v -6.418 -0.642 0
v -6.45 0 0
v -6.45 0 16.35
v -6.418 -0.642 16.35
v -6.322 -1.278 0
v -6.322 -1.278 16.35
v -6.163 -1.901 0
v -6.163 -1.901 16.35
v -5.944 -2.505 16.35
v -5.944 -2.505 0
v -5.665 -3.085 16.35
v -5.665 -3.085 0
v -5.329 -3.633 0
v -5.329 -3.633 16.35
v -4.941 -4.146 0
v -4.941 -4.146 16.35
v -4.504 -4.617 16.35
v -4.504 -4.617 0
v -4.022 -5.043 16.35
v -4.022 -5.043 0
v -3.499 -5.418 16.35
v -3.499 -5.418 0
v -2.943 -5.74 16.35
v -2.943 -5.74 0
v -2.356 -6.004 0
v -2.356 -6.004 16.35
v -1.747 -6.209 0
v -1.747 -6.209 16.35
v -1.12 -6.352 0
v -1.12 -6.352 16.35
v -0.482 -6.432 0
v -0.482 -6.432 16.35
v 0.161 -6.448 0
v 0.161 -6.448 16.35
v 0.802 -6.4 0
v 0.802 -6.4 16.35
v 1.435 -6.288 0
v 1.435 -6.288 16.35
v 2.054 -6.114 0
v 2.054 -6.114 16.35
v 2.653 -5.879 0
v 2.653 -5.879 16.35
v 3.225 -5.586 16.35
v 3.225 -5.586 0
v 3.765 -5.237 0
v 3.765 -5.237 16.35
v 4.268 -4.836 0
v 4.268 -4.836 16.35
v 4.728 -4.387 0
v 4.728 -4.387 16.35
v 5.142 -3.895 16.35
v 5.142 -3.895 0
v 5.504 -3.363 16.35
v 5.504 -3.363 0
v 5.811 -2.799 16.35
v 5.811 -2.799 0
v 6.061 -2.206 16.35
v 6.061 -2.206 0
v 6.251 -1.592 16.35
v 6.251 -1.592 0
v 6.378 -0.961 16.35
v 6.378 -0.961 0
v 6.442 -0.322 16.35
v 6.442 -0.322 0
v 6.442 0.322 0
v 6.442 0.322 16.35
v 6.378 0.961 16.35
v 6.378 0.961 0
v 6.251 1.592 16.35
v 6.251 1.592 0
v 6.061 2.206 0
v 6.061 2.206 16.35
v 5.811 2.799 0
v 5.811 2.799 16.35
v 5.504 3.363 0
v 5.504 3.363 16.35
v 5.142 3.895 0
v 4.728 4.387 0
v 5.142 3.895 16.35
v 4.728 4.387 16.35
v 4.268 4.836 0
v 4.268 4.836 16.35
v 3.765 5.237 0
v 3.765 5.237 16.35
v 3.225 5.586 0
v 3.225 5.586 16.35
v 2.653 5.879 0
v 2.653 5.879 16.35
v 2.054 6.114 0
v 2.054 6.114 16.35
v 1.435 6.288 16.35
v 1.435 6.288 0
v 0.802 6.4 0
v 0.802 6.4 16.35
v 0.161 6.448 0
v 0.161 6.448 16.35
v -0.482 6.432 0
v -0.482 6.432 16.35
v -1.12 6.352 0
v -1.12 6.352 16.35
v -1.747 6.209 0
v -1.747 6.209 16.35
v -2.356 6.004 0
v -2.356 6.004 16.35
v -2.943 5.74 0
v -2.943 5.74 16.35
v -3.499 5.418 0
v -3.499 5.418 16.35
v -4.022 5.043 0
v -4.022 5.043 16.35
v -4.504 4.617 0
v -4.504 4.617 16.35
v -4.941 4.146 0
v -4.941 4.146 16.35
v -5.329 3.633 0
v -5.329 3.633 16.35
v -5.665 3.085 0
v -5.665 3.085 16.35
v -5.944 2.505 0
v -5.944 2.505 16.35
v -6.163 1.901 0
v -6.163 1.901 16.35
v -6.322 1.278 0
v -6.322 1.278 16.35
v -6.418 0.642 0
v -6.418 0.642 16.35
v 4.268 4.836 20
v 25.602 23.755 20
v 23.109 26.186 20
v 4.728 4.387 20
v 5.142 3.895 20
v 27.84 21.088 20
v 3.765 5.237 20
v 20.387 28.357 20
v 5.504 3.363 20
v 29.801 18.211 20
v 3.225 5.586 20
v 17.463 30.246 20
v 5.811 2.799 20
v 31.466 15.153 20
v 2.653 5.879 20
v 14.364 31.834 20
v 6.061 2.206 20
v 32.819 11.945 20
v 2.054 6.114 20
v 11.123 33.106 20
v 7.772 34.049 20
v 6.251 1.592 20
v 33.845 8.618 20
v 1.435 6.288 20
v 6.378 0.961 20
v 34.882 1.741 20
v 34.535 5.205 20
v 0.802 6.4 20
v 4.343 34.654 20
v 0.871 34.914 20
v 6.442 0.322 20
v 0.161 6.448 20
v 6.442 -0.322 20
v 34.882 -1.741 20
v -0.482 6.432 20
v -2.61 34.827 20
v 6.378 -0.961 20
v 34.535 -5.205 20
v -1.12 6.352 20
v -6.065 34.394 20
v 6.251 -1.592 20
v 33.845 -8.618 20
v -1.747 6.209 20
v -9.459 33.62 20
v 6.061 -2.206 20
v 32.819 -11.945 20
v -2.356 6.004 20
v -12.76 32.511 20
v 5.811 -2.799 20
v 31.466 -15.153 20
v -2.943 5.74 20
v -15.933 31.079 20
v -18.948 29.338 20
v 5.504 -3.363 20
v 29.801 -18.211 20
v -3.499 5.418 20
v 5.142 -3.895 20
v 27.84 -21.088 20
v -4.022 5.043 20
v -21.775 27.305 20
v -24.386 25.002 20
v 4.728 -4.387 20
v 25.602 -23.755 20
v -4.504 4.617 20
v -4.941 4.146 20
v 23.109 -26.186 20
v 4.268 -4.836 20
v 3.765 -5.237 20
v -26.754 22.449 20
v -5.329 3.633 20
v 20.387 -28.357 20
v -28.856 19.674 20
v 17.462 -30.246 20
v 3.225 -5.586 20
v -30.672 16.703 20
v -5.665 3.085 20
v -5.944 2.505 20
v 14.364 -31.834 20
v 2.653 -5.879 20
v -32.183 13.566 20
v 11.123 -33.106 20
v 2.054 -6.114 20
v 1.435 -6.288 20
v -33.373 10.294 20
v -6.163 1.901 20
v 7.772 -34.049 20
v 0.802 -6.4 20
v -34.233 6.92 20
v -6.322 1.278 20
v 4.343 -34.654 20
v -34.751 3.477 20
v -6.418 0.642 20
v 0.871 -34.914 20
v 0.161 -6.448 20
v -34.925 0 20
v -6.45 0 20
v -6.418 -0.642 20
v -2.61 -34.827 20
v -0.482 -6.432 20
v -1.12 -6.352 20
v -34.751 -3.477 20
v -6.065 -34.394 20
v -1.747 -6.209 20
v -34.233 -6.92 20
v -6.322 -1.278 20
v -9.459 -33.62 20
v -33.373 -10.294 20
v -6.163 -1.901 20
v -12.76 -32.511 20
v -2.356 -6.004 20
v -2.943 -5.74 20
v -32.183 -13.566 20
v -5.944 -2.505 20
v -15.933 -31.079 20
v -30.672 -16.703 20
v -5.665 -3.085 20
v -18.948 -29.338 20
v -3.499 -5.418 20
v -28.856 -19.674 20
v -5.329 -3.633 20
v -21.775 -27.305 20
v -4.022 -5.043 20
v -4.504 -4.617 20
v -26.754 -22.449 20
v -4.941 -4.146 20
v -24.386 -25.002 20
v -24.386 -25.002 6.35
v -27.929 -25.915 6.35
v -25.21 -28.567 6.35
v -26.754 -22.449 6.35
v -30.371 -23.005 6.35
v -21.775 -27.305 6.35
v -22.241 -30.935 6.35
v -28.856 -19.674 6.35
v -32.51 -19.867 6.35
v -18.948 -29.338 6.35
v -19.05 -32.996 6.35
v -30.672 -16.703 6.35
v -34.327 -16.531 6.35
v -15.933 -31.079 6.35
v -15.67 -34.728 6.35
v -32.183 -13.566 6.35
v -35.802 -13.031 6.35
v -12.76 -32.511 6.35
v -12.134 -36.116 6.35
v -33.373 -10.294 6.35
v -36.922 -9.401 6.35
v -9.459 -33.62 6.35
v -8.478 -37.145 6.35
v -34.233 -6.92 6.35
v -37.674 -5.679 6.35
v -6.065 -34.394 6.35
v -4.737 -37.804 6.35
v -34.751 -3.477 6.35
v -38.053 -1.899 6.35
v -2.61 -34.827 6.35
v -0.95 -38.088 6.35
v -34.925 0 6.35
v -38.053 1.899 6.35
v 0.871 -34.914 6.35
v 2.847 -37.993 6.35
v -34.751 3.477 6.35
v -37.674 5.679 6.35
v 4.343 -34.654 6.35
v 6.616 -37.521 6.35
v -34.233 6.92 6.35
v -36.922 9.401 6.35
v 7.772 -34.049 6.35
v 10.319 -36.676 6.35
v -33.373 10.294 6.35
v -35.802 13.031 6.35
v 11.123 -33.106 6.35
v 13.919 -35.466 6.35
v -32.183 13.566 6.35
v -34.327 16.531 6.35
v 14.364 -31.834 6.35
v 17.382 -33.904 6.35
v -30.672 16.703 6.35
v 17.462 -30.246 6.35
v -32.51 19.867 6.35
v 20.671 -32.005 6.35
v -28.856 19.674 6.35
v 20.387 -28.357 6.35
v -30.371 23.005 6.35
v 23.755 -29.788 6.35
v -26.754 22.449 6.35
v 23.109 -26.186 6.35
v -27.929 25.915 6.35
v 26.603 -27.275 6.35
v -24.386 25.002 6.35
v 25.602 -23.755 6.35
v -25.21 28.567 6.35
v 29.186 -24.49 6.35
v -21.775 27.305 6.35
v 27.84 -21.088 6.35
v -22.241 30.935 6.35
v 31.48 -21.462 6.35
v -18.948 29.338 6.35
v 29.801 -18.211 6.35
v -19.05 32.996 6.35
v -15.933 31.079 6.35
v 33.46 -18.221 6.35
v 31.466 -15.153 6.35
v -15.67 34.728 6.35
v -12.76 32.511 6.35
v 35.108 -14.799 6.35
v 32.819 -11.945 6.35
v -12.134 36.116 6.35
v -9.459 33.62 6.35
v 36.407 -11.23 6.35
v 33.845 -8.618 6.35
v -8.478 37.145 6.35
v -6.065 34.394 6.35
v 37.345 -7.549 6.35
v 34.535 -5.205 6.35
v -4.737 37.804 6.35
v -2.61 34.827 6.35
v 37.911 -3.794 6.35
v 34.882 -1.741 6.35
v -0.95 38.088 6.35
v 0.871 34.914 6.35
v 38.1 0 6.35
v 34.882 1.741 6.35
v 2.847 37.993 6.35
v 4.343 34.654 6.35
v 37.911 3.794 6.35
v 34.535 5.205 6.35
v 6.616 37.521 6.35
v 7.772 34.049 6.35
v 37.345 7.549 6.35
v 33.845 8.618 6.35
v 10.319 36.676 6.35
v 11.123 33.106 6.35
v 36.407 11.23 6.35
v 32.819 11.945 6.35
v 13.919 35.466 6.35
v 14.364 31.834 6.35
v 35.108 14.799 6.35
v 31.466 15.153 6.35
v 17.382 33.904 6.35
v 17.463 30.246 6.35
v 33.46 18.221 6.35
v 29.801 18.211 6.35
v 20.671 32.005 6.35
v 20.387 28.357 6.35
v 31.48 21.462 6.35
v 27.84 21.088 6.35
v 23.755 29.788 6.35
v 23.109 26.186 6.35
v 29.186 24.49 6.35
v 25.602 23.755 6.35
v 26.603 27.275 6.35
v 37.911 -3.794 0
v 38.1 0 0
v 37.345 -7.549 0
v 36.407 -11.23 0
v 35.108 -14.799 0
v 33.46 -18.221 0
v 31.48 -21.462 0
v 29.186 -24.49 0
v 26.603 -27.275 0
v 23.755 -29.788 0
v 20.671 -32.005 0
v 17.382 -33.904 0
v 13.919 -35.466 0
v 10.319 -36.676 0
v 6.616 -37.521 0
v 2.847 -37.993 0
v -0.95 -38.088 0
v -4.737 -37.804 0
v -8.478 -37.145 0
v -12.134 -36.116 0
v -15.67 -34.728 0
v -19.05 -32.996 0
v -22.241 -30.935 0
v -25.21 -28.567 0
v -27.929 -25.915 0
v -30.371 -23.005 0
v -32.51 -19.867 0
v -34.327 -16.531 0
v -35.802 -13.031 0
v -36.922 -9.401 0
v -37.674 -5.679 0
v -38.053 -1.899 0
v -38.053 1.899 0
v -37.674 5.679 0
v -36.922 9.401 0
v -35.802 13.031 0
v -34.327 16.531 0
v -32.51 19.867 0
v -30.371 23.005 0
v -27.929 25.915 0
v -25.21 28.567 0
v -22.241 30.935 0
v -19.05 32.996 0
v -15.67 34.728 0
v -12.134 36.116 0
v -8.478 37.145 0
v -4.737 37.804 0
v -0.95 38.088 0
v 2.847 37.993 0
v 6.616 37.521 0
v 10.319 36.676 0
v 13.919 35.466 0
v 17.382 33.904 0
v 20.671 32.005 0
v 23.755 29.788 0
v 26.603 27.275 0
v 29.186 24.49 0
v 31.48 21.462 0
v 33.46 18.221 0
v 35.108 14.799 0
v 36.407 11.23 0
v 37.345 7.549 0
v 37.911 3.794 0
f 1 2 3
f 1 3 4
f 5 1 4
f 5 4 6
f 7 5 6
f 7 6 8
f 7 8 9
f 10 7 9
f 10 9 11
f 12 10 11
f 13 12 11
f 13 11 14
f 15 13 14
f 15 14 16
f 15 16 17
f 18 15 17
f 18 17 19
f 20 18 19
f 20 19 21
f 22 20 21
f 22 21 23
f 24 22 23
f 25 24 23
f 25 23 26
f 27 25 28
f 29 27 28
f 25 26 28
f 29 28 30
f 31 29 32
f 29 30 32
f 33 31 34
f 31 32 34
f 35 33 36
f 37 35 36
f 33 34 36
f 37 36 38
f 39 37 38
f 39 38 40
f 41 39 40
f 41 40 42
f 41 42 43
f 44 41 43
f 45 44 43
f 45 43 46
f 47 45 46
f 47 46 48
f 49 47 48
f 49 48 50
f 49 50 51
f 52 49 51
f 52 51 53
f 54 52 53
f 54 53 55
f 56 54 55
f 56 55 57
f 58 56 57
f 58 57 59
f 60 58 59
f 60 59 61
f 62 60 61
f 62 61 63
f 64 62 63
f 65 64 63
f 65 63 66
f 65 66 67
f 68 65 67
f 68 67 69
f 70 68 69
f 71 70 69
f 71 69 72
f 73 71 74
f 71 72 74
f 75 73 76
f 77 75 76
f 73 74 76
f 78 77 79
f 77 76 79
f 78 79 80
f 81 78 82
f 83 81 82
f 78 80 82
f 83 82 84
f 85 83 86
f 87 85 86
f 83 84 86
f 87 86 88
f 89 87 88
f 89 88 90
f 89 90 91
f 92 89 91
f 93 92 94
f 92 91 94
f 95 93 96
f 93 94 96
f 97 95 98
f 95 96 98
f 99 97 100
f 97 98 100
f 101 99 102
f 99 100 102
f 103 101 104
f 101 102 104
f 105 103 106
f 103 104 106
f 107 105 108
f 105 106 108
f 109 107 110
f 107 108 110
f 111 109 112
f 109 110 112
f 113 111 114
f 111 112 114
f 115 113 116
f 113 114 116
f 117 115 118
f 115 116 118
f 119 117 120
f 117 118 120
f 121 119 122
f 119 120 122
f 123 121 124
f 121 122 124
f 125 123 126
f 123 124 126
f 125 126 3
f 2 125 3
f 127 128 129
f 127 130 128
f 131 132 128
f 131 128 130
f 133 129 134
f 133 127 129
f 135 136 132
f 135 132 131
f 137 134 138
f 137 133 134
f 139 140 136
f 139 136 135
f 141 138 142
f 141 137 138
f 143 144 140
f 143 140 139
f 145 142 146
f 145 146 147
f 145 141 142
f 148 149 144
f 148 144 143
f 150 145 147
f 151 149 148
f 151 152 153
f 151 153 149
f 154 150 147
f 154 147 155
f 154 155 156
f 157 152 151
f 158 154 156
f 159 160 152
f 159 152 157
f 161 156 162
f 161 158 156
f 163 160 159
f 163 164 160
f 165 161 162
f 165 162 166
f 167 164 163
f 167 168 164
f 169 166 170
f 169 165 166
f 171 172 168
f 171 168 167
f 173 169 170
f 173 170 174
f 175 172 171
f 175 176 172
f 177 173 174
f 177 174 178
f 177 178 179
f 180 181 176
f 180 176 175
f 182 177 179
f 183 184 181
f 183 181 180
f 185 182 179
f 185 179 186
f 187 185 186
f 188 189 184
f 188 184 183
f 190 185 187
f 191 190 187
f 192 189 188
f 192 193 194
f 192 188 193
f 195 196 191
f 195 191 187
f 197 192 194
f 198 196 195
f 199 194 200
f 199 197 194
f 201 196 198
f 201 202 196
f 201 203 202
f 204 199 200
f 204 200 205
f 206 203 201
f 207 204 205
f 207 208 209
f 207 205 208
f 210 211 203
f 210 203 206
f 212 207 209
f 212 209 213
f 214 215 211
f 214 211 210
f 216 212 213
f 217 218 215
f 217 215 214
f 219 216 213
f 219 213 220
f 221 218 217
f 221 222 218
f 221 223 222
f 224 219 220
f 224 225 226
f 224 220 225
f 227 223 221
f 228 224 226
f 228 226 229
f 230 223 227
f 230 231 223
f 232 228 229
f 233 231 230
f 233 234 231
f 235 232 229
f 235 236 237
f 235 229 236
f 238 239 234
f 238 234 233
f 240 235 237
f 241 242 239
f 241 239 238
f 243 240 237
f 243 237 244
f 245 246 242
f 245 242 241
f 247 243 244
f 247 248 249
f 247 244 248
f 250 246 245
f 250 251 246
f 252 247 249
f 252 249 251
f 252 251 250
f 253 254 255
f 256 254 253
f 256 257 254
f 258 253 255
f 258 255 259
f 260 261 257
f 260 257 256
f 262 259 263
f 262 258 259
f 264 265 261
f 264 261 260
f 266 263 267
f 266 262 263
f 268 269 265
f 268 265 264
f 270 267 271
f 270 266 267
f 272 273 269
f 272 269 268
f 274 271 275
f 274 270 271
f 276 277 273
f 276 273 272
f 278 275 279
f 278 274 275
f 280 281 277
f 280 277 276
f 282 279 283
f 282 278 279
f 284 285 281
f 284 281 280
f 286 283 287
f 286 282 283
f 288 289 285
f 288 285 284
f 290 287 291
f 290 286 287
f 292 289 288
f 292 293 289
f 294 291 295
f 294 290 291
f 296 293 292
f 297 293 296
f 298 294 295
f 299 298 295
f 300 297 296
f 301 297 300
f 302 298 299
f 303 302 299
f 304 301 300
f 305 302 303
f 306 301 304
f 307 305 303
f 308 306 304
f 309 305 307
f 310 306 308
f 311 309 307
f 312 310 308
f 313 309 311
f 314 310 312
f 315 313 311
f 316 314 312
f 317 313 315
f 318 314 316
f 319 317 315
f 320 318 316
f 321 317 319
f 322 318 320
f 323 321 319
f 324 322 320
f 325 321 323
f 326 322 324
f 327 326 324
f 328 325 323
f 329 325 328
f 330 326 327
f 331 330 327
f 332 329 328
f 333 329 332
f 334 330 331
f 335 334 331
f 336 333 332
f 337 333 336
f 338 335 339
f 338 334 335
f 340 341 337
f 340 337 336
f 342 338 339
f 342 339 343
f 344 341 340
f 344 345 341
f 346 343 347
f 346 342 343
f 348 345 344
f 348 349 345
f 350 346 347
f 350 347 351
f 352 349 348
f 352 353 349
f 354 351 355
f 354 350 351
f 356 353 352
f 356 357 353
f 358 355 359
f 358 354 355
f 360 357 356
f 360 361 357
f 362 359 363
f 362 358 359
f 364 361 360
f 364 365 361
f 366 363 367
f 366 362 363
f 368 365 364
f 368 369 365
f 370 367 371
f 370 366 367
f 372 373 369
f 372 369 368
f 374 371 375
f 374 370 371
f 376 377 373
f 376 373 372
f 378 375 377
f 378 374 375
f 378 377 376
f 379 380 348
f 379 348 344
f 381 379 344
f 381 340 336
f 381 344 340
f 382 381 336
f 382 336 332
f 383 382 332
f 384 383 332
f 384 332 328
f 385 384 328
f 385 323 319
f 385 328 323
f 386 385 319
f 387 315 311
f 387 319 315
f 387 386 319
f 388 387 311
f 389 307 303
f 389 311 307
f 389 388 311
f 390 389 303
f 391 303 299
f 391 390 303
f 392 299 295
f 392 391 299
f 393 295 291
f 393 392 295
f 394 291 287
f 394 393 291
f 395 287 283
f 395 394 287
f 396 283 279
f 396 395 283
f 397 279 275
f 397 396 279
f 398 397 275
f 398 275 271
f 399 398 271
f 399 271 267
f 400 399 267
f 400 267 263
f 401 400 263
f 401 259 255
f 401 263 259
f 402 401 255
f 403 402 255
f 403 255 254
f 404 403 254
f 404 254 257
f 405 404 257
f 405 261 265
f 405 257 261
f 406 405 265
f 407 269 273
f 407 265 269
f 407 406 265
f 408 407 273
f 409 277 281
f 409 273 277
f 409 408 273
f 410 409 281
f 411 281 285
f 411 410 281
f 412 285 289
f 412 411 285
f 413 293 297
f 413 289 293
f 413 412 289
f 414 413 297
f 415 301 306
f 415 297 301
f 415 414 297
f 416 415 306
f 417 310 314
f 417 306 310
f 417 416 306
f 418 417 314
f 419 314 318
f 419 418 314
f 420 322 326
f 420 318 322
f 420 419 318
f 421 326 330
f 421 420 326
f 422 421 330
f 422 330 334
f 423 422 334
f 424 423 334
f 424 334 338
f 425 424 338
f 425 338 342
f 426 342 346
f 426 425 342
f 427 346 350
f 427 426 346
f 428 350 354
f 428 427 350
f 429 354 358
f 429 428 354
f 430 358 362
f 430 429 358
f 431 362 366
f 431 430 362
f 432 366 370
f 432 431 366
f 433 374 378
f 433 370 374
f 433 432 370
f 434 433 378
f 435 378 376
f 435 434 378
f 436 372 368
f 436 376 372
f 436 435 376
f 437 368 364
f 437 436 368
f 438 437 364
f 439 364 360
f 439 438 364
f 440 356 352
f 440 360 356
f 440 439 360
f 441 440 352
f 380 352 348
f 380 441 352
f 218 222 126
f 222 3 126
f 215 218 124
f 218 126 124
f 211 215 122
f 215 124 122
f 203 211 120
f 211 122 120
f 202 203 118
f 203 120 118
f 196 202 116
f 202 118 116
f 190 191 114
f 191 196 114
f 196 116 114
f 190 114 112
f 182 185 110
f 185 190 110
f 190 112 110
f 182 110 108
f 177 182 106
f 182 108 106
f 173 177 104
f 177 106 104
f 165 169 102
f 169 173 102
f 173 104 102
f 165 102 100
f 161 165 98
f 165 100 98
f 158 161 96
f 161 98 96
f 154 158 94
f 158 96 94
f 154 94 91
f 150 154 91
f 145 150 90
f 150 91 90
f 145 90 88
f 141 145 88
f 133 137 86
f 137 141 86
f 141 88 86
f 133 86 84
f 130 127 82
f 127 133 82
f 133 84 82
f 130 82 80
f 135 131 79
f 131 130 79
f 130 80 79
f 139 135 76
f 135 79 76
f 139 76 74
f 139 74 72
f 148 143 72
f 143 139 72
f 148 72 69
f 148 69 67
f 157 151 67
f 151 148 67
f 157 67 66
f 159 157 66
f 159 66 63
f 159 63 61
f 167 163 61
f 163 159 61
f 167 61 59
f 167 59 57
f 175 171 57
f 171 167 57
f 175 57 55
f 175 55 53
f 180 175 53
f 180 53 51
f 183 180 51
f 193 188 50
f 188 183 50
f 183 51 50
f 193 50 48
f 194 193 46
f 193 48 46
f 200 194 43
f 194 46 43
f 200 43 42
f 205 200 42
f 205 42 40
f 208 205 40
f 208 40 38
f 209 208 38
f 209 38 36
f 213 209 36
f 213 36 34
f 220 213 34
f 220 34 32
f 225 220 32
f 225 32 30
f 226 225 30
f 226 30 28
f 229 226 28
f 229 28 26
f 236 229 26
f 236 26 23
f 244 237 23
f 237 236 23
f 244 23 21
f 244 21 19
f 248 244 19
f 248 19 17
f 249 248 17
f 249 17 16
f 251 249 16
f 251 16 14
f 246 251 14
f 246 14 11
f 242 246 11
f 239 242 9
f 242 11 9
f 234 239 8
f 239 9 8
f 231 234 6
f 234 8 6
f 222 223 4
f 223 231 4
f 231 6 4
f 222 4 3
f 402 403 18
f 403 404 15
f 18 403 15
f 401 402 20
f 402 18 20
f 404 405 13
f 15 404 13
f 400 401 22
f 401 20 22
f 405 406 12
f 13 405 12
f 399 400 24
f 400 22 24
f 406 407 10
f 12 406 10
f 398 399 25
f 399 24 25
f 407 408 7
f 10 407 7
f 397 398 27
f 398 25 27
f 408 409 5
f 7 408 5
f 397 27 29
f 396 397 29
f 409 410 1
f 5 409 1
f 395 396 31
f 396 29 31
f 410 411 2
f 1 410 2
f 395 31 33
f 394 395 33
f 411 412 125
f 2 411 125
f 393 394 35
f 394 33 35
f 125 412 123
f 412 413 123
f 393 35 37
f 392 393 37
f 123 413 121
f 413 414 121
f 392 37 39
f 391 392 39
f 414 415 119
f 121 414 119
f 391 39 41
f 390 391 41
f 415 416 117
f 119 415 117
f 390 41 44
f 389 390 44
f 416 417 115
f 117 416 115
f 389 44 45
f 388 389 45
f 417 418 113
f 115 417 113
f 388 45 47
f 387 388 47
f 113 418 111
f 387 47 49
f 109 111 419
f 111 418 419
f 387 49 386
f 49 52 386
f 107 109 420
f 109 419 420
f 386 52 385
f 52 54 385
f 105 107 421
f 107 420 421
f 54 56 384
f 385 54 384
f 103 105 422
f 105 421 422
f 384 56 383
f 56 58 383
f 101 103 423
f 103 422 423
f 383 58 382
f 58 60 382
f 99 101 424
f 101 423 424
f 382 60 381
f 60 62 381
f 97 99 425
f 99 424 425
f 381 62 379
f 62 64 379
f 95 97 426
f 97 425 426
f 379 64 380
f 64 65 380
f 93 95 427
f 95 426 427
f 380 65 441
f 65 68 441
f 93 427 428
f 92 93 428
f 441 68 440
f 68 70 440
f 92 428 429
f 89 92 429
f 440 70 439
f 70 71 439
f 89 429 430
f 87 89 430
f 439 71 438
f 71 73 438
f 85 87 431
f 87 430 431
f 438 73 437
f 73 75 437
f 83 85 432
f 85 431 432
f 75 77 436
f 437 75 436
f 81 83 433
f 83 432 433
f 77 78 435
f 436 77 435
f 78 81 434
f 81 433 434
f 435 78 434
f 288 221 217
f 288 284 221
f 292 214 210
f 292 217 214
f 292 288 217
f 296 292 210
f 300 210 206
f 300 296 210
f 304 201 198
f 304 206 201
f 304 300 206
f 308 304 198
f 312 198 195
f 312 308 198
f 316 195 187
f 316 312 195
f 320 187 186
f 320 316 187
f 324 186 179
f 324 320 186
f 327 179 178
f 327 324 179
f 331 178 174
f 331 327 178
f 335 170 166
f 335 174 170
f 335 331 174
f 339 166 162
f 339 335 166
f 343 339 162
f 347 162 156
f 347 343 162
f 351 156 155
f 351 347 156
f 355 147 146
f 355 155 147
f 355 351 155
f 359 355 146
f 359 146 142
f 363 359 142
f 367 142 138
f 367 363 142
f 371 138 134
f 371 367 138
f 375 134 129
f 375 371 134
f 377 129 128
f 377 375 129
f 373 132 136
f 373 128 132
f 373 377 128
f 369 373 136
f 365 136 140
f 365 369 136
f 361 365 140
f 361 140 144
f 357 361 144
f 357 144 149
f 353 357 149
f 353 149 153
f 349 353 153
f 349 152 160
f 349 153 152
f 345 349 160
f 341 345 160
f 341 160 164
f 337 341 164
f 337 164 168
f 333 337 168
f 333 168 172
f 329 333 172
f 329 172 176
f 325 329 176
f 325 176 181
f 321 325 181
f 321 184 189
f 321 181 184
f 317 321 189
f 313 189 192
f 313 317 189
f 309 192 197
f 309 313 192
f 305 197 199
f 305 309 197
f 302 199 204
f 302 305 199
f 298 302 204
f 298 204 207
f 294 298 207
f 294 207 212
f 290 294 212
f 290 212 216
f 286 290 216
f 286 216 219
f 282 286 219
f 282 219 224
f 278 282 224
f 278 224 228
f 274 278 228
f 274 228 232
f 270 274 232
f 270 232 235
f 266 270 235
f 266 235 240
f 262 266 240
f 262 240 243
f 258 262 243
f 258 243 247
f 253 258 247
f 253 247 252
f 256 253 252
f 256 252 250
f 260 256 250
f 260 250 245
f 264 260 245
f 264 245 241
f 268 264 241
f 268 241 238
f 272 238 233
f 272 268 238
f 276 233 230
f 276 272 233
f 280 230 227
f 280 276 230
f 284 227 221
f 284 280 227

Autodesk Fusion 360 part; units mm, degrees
sketch "Roller_End_Cap_Outter" plane through (0, 0, 0) normal (0, 0, 1) x (1, 0, 0)
  circle A0 centre (0, 0) radius 38.1
  dimension "d2" = 76.2
extrude "Extrude1" add sketch "Roller_End_Cap_Outter" along normal blind 6.35
sketch "Roller_End_Cap_Inner" plane through (0, 0, 6.35) normal (0, 0, 1) x (-1, 0, 0)
  circle A0 centre (0, 0) radius 38.1
  circle A1 centre (0, 0) radius 34.925
  dimension "d7" = 69.85
extrude "Extrude3" add sketch "Roller_End_Cap_Inner" along normal blind 10 contours A1
sketch "Shaft Hole" plane through (0, 0, 16.35) normal (0, 0, 1) x (-1, 0, 0)
  circle A0 centre (0, 0) radius 34.925
  circle A1 centre (0, 0) radius 6.45
  dimension "d10" = 12.9
extrude "Extrude4" cut sketch "Shaft Hole" against normal through all contours A1
extrude "Extrude5" add 1 faces at (-25.3033, 1.7351, 16.35) along direction (0, 0, 1) blind 3.65
